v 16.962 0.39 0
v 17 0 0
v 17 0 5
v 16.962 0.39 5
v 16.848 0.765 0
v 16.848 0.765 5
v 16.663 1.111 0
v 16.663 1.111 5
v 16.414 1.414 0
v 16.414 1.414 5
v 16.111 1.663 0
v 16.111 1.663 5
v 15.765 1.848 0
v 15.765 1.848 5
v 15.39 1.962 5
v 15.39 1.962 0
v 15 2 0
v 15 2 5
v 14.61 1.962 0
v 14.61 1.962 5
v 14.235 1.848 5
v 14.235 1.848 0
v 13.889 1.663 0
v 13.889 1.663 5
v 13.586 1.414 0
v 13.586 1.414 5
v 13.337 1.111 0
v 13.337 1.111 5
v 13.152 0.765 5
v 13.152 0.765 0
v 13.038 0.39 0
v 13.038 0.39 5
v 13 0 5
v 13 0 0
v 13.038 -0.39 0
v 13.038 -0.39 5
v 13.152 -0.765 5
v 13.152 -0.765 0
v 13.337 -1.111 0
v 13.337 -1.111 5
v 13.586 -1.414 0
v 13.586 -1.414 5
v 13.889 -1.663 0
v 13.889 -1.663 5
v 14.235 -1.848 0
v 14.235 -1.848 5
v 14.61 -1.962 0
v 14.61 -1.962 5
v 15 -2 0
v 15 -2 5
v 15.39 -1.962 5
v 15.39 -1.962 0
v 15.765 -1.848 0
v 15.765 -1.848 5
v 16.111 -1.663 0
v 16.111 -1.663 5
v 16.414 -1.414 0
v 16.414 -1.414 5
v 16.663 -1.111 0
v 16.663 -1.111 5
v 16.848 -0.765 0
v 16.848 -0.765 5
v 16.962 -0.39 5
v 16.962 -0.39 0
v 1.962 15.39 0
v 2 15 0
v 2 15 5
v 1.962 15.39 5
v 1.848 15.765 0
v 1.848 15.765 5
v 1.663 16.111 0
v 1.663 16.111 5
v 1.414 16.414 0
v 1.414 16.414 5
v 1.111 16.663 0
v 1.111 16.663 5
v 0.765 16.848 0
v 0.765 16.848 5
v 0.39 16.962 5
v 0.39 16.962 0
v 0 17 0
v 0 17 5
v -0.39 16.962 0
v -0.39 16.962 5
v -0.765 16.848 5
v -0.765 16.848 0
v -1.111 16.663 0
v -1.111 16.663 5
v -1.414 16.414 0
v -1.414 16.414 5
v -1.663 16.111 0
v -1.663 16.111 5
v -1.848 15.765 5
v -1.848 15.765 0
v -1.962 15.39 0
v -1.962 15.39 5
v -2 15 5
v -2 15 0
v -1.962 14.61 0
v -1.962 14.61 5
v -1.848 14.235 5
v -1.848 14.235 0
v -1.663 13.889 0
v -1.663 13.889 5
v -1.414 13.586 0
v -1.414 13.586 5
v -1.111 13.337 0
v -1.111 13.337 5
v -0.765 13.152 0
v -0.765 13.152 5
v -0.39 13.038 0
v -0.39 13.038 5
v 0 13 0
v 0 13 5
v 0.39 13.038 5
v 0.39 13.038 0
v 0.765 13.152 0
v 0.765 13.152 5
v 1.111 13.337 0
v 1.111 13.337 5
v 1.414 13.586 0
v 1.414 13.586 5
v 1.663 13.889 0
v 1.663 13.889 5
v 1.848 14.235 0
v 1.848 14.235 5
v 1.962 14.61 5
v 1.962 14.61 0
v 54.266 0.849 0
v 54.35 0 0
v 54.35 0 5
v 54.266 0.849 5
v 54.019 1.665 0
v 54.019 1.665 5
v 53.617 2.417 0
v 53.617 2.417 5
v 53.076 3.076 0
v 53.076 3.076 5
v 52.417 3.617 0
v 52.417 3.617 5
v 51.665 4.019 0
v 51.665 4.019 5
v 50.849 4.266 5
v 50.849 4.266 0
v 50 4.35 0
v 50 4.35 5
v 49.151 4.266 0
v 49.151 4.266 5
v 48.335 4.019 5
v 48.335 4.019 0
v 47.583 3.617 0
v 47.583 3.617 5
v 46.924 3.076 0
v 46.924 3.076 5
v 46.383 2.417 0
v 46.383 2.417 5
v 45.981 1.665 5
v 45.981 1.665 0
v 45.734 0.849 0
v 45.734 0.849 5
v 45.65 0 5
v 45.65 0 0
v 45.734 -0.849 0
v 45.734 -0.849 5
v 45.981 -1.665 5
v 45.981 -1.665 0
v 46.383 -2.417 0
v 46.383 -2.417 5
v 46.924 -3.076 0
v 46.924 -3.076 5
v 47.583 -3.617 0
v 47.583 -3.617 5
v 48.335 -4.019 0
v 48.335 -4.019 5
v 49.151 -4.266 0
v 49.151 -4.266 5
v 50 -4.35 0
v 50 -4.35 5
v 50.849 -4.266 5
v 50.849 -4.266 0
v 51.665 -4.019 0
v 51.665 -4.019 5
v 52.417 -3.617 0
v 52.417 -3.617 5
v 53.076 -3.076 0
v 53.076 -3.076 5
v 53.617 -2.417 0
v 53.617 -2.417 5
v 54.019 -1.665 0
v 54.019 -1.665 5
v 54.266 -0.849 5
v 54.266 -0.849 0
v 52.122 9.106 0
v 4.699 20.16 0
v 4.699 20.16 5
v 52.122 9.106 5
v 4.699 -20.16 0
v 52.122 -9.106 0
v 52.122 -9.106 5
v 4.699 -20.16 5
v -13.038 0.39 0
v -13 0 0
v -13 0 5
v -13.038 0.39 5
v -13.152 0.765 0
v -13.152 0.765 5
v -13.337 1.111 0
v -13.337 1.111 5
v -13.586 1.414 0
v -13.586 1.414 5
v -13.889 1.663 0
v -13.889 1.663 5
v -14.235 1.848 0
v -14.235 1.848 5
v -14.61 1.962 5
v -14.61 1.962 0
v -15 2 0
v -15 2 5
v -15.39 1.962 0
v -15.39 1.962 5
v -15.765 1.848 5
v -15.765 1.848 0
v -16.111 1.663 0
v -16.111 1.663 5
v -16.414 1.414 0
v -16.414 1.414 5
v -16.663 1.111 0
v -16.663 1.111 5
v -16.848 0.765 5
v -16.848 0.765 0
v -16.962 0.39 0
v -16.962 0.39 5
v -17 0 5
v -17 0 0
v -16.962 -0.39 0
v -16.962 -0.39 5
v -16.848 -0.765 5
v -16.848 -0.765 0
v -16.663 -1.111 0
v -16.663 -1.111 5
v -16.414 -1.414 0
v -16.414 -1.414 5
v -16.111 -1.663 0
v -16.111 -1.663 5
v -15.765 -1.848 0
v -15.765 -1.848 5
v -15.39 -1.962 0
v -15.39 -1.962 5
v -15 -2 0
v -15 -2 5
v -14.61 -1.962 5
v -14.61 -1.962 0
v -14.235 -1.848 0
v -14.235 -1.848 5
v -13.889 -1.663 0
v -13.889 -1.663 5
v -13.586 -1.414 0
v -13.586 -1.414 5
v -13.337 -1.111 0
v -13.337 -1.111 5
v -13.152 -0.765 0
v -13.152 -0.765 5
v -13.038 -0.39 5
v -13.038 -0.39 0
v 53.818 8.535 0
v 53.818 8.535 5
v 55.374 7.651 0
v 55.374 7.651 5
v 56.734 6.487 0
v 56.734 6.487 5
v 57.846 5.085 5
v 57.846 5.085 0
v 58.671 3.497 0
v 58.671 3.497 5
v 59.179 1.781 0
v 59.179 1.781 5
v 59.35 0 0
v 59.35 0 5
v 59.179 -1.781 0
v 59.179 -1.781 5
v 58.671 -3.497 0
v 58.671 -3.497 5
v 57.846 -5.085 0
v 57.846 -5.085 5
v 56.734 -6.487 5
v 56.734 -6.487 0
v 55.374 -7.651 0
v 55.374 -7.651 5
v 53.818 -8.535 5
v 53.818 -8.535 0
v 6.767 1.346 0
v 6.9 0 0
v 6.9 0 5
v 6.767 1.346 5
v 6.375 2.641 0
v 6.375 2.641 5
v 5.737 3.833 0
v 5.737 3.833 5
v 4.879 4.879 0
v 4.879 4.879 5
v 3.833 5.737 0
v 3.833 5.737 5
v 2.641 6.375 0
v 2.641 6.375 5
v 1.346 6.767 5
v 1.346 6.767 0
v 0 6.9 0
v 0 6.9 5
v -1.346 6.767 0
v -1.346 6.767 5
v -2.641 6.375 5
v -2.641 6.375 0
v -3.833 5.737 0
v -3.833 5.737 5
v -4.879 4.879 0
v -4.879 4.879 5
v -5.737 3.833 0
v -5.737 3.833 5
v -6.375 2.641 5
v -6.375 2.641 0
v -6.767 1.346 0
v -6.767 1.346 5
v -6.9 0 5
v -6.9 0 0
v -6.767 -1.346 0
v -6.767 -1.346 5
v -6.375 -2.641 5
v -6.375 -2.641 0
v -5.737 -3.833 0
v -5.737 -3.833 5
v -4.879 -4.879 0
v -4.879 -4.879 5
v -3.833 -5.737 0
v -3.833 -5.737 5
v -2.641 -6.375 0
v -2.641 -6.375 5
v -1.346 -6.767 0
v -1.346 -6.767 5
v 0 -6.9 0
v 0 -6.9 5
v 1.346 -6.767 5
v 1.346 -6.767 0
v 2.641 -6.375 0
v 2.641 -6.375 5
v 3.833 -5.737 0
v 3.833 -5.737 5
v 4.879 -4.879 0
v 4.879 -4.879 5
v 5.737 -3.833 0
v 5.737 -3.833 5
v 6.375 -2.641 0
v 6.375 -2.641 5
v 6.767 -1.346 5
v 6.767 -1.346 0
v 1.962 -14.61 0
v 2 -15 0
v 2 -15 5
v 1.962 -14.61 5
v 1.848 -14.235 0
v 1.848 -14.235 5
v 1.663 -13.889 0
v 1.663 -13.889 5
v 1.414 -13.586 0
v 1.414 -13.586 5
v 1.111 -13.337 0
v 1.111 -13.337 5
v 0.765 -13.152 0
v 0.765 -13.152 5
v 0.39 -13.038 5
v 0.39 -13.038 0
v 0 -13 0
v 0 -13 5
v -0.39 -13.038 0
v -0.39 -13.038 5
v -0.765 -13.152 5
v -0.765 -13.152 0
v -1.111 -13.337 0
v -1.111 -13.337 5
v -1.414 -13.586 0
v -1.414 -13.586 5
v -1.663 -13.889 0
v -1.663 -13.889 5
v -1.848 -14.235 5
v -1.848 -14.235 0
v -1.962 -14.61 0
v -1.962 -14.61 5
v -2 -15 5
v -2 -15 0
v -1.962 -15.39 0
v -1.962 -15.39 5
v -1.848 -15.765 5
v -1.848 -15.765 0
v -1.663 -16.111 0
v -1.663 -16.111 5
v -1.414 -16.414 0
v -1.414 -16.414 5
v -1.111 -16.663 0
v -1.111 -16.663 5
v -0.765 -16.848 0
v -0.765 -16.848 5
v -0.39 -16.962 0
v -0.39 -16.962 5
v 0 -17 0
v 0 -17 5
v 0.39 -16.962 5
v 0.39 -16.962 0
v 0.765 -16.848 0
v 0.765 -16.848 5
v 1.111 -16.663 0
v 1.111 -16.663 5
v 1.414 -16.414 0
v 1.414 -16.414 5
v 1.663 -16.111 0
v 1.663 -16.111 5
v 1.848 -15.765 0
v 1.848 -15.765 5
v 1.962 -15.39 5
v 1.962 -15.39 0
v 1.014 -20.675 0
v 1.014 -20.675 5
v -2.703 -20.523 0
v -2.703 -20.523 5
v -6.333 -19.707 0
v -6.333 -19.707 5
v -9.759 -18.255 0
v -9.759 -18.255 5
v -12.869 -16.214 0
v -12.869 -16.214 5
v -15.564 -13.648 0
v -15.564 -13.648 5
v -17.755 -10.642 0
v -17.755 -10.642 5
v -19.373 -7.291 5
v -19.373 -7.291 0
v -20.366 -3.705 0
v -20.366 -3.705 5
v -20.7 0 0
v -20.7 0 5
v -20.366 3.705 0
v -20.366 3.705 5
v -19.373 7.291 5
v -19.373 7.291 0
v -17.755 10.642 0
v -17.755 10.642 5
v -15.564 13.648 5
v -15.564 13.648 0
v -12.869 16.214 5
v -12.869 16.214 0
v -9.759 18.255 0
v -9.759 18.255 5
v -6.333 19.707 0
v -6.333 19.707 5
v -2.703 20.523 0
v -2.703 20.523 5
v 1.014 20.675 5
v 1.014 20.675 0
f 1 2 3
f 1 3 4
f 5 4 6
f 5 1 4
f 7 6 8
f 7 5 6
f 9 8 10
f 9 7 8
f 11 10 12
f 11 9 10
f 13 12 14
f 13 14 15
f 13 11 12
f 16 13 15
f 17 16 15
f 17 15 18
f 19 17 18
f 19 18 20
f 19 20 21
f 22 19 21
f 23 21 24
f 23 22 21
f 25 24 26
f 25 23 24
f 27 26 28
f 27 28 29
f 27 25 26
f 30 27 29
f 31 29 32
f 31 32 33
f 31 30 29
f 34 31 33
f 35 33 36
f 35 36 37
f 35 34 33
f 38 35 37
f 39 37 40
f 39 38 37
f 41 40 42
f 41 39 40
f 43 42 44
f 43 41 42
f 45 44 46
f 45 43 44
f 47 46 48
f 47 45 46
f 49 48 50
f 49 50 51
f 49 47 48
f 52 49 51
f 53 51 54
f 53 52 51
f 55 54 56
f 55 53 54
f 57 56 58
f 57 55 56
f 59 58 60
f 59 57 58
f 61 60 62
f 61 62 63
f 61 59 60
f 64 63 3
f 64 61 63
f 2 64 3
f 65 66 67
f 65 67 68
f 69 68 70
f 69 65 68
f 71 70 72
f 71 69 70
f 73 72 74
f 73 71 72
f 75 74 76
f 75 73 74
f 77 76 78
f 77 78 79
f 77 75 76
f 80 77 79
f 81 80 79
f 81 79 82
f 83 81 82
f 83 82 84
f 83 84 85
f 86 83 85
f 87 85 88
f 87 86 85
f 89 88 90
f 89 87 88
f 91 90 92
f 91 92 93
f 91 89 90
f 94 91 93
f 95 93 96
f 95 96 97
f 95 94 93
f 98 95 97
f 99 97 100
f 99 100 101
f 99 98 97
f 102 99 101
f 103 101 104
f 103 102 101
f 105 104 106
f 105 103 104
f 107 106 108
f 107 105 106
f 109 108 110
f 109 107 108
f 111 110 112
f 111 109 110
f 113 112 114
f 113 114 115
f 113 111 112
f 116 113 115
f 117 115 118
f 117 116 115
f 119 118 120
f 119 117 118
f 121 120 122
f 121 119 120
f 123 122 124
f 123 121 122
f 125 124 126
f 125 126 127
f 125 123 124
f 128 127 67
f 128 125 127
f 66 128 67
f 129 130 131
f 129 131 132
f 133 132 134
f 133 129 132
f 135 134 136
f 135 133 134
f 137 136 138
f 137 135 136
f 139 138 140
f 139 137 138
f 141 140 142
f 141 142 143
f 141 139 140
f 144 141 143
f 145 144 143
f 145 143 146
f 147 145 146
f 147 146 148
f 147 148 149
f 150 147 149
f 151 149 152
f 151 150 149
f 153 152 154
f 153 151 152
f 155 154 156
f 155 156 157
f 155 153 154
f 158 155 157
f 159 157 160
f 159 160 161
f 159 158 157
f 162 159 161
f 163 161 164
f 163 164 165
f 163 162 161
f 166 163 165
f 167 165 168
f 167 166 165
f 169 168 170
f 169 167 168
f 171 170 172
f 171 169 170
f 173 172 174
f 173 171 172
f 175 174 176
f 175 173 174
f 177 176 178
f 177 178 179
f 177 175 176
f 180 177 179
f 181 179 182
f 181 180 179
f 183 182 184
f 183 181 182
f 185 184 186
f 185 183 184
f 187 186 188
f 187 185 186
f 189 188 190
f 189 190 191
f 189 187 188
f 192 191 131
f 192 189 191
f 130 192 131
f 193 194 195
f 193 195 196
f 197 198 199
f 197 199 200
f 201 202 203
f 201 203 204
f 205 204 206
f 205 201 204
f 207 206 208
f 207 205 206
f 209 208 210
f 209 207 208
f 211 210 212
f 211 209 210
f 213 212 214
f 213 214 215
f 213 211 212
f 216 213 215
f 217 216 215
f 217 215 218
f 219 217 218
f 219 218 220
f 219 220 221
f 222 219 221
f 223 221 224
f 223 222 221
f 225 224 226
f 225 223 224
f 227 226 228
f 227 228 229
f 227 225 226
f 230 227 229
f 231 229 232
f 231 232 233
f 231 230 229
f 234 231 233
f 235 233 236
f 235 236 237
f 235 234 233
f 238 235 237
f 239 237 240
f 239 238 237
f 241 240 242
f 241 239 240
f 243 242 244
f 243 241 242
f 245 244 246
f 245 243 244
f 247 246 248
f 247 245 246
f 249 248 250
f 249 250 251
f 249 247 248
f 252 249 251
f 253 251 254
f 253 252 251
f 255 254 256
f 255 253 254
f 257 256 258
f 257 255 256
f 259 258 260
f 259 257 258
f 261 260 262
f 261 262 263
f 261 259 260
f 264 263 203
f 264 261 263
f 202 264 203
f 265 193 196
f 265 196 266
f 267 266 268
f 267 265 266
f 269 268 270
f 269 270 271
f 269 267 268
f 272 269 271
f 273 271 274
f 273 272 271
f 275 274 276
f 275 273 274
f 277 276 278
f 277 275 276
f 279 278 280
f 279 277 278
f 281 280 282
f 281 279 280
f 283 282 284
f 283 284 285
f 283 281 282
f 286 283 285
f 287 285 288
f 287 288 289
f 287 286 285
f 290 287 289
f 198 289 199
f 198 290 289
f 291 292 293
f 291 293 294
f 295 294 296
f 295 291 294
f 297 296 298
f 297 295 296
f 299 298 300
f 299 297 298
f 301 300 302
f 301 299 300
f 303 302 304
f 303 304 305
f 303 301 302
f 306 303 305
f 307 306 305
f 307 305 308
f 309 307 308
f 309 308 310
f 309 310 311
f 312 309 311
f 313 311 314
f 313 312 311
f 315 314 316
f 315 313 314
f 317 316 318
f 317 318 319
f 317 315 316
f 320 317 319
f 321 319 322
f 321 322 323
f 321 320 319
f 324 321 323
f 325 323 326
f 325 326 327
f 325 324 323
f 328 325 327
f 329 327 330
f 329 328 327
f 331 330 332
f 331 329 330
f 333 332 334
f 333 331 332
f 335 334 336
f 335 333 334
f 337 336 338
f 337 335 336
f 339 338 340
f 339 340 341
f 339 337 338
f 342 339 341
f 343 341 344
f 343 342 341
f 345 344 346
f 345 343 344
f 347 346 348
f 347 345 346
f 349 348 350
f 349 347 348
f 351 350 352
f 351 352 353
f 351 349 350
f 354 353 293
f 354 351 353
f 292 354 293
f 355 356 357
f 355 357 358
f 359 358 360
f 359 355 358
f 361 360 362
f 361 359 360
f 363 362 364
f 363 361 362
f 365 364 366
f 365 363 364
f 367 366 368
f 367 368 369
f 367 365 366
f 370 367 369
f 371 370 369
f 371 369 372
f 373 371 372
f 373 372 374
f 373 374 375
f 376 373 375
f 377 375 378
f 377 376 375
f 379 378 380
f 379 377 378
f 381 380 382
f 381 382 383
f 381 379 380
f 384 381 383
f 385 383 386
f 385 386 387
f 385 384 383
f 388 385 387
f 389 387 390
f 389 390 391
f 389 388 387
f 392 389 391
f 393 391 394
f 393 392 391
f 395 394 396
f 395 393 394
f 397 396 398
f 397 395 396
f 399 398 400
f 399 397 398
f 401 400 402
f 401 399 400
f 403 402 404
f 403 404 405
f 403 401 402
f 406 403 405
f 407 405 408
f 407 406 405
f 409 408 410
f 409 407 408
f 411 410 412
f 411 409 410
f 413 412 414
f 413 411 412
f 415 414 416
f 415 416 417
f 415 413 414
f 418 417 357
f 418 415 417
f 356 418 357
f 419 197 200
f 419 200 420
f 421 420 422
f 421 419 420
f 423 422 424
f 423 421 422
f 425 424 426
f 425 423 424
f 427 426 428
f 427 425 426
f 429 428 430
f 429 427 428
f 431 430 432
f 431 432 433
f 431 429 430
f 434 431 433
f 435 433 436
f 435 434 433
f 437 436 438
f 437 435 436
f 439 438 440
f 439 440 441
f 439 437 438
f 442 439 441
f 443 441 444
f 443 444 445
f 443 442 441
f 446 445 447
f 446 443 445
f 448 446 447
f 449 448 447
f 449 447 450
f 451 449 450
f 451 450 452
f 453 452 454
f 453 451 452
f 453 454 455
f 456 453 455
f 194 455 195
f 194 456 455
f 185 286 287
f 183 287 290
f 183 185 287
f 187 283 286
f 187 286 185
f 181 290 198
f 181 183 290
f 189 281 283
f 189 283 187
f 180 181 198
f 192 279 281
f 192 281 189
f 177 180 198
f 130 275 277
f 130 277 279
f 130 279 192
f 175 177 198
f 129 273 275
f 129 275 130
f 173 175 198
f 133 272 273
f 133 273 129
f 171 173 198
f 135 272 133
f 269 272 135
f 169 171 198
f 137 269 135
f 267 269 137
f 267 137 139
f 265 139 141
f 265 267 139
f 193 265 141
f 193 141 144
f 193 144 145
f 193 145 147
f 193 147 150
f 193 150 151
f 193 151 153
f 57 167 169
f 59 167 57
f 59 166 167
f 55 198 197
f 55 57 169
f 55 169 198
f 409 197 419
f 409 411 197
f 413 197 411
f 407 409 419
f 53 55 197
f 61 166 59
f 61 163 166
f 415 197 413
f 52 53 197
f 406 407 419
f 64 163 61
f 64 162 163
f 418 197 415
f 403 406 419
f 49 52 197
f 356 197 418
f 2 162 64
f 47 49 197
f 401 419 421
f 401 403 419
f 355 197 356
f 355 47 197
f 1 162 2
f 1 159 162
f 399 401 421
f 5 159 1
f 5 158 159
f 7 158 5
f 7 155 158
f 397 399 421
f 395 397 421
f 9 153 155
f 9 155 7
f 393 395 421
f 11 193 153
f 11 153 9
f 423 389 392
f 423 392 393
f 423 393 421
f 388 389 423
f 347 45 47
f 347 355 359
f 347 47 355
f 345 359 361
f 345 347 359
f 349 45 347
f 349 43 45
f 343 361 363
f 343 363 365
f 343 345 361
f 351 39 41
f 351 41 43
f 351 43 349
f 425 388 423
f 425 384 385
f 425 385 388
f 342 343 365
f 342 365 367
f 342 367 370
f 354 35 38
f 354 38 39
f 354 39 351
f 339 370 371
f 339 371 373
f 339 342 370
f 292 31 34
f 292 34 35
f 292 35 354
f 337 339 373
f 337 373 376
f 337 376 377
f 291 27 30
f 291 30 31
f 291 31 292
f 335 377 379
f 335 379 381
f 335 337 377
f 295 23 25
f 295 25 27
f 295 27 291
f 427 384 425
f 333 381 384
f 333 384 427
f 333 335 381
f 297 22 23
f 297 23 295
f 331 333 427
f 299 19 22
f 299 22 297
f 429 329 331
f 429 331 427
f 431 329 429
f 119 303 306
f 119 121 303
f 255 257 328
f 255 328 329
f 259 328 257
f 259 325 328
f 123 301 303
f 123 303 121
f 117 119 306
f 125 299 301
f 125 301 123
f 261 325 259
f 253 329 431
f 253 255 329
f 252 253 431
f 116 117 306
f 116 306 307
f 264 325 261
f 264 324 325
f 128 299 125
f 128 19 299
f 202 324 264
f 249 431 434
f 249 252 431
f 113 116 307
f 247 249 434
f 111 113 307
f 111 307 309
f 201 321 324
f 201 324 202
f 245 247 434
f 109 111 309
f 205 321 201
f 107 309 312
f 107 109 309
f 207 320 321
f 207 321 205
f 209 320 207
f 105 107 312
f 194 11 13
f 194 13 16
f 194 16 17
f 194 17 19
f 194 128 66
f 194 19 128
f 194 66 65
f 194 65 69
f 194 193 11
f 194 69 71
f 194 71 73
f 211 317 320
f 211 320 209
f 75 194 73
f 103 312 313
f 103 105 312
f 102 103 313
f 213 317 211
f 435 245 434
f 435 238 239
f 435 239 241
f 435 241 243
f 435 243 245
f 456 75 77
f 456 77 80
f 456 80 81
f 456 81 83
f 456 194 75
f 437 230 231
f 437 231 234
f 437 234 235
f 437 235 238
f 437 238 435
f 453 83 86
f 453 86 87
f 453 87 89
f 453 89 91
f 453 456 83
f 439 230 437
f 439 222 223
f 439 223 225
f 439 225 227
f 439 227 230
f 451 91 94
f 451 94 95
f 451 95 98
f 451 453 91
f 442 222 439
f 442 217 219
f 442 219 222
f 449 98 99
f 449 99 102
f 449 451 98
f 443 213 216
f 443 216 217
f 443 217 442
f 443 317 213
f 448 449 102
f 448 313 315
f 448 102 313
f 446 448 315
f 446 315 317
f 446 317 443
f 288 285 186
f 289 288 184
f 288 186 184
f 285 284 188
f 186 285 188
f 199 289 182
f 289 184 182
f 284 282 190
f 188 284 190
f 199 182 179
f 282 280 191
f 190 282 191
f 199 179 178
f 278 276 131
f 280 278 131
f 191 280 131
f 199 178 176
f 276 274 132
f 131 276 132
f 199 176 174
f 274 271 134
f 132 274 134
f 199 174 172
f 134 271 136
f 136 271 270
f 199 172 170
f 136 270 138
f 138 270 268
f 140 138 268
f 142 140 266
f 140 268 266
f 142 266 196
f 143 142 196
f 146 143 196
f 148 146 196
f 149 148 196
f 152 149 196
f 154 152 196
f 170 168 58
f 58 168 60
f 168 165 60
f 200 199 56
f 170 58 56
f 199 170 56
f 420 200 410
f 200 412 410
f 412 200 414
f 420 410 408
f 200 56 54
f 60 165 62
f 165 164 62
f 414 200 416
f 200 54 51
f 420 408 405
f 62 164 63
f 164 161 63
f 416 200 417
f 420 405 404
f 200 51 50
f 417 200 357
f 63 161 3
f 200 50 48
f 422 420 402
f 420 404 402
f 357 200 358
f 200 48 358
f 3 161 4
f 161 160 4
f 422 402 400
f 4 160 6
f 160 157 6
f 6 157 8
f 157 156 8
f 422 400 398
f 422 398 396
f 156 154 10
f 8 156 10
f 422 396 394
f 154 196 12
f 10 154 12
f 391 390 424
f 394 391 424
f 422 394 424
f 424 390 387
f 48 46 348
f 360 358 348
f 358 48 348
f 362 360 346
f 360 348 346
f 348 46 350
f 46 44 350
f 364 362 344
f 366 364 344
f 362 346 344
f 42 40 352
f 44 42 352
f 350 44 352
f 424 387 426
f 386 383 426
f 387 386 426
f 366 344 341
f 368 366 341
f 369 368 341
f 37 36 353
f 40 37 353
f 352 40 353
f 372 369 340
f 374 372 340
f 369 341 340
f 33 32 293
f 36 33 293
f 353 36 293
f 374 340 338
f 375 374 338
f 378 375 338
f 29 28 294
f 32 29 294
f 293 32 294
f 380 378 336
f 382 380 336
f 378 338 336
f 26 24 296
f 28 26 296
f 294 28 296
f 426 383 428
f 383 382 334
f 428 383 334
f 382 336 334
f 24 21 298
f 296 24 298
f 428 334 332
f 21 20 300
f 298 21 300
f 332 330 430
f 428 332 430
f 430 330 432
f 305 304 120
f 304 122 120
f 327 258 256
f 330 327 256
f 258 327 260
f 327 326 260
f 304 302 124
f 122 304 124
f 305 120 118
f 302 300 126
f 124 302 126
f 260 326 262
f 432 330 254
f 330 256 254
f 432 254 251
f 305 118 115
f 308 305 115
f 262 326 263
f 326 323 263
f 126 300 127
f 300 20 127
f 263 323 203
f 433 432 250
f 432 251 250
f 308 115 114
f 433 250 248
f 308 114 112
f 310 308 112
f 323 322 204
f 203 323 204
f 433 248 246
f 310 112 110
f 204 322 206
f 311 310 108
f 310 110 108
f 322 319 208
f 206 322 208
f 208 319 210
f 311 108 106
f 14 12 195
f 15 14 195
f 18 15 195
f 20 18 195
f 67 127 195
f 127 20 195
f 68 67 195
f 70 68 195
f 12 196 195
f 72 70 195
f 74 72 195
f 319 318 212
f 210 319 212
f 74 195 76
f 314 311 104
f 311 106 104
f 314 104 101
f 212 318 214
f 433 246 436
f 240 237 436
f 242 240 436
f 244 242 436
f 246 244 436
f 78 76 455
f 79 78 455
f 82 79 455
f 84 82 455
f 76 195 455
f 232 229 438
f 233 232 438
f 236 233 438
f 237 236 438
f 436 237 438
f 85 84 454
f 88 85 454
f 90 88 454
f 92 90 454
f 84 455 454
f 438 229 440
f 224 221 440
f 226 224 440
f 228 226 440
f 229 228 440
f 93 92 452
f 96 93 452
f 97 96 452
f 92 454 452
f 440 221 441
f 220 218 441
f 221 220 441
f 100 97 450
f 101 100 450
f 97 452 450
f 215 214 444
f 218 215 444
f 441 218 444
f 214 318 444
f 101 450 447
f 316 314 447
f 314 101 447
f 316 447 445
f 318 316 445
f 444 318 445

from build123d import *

# Parameters (mm, degrees)
SKETCH1_R           = 6.9
SKETCH1_R_2         = 4.35
SKETCH1_R_3         = 2
BOSS_EXTRUDE1_DEPTH = 5


with BuildPart() as part:
    # Sketch1 → Boss-Extrude1 (new body)
    with BuildSketch(Plane.XY):
        with BuildLine():
            Line((4.6989, 20.159621494), (52.12245, 9.105915989))
            ThreePointArc((52.12245, 9.105915989), (59.35, 0), (52.12245, -9.105915989))
            Line((52.12245, -9.105915989), (4.6989, -20.159621494))
            ThreePointArc((4.6989, -20.159621494), (-20.7, 0), (4.6989, 20.159621494))
        make_face()
        Circle(SKETCH1_R, mode=Mode.SUBTRACT)
        with Locations((50, 0)):
            Circle(SKETCH1_R_2, mode=Mode.SUBTRACT)
        with Locations((15, 0)):
            Circle(SKETCH1_R_3, mode=Mode.SUBTRACT)
        with Locations((0, -15)):
            Circle(SKETCH1_R_3, mode=Mode.SUBTRACT)
        with Locations((-15, 0)):
            Circle(SKETCH1_R_3, mode=Mode.SUBTRACT)
        with Locations((0, 15)):
            Circle(SKETCH1_R_3, mode=Mode.SUBTRACT)
    extrude(amount=BOSS_EXTRUDE1_DEPTH)


solid = part.part
